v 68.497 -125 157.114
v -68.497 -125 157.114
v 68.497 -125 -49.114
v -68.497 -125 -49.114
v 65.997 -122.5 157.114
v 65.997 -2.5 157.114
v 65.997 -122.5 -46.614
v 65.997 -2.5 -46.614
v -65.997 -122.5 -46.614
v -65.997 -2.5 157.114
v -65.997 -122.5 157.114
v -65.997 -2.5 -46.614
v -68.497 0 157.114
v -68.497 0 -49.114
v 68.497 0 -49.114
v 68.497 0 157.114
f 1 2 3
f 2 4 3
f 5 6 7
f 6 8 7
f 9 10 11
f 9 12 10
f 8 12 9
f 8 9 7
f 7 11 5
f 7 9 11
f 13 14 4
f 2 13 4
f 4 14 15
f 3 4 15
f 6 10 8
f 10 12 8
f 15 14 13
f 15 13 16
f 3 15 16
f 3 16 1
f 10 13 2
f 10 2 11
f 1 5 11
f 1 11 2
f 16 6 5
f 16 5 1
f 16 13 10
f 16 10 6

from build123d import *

# Parameters (mm, degrees)
F0_W     = 136.9934380054
F0_H     = 98.2272103429
F1_DEPTH = 125
F2_DEPTH = 108
F3_T     = -2.5


with BuildPart() as f1:
    # F0 (on Front) → F1 (new body)
    with BuildSketch(Plane.XZ):
        Rectangle(F0_W, F0_H)
    extrude(amount=F1_DEPTH)

    # F2 (add): a face of the model
    f2_faces = [f1.faces().sort_by_distance(p)[0] for p in [
        (0, -62.5, 49.1136051714),
    ]]
    extrude(f2_faces, amount=F2_DEPTH)

    # F3
    f3_openings = [f1.faces().sort_by_distance(p)[0] for p in [
        (0, -62.5, 157.113605),
    ]]
    offset(amount=F3_T, openings=f3_openings)


solid = f1.part
